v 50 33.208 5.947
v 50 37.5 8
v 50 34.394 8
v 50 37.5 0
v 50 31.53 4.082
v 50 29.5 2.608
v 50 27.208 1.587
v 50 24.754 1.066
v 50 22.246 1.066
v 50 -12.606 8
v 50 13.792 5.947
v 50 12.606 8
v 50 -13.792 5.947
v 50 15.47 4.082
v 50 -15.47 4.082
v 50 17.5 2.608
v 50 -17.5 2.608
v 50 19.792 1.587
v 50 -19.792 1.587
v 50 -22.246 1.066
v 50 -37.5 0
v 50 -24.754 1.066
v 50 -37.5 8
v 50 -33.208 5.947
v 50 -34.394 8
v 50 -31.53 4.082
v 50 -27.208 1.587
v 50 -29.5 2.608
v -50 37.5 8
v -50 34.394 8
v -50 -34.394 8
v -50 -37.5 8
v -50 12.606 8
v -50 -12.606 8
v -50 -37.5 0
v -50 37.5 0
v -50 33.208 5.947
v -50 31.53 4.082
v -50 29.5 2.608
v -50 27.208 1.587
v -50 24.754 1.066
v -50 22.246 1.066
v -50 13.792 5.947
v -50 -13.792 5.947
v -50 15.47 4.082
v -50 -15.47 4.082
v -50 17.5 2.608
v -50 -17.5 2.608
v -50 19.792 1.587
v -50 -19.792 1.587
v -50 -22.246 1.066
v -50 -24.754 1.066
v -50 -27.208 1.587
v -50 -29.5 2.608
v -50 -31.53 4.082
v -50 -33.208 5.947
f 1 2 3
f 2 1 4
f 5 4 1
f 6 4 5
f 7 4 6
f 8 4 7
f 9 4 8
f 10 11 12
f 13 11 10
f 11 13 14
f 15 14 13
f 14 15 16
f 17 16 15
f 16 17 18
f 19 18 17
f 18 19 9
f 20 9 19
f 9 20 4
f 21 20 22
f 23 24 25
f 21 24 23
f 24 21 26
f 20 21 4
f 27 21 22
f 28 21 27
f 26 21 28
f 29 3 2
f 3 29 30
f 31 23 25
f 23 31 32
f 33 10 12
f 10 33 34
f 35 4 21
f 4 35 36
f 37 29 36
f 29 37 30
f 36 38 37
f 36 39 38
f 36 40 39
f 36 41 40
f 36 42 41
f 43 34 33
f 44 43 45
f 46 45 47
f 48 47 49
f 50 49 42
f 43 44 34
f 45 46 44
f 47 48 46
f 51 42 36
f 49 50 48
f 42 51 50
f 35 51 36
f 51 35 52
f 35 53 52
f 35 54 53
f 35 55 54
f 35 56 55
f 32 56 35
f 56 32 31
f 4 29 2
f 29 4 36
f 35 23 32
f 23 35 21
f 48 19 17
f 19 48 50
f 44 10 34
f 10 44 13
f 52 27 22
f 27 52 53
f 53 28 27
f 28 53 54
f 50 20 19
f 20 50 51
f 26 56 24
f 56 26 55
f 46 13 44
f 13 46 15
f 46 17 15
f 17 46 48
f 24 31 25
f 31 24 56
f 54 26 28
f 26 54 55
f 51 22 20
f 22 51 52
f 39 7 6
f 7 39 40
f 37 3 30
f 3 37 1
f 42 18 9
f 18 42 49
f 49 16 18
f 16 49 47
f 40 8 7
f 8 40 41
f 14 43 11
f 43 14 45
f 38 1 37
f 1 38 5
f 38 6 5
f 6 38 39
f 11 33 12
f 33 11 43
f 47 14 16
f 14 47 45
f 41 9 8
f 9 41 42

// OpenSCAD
translate([-50,-75/2]) {
    difference() {
        cube([100,75,8]);
        //rotate([90,0,90]) translate([55,14,-10]) cylinder(h=120,r=12);
        //rotate([90,0,90]) translate([20,14,-10]) cylinder(h=120,r=12);
        rotate([90,0,90]) translate([14,13,-10]) cylinder(h=120,r=12);
        rotate([90,0,90]) translate([75-14,13,-10]) cylinder(h=120,r=12);
    }
}
